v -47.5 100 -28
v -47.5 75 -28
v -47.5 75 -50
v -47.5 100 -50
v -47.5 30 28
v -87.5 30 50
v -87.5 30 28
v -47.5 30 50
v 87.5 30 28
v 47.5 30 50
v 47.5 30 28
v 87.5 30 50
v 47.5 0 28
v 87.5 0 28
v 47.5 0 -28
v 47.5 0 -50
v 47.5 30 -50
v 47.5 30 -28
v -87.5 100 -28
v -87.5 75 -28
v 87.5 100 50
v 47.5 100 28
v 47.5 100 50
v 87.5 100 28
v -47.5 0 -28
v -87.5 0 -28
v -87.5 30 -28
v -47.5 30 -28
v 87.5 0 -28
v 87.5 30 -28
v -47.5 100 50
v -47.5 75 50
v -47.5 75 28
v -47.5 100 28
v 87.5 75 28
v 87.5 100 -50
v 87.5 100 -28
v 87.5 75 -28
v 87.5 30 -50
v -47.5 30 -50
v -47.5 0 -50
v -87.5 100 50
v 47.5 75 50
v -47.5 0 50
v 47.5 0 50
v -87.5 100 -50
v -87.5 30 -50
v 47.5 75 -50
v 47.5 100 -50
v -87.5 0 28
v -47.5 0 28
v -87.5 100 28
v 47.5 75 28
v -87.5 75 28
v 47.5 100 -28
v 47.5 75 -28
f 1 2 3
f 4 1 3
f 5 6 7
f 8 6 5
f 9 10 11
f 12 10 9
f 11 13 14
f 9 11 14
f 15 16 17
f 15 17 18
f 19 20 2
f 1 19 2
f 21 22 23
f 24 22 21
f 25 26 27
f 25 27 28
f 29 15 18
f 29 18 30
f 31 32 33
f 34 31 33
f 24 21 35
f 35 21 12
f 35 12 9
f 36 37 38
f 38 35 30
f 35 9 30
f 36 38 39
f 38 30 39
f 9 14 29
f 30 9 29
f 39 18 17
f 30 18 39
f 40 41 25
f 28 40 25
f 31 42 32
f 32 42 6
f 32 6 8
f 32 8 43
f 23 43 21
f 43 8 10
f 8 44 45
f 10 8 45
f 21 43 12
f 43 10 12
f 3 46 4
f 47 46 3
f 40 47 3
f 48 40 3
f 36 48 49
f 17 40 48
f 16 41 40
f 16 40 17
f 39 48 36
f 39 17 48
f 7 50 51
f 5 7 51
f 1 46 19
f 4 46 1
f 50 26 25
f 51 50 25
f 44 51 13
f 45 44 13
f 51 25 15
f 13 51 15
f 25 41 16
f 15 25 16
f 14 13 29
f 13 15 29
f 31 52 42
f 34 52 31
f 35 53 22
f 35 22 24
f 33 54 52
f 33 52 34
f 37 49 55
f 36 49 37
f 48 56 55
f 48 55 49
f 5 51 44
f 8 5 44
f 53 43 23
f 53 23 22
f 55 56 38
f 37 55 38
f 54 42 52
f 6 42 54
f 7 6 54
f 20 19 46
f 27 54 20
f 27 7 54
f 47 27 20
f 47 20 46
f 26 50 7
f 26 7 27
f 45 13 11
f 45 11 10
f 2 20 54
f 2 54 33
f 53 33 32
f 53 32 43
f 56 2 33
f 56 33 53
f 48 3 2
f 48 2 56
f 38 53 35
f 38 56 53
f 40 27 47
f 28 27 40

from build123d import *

# Parameters (mm, degrees)
SKETCH2_W           = 175
SKETCH2_H           = 100
BOSS_EXTRUDE1_DEPTH = 75
SKETCH3_W           = 40
SKETCH3_H           = 22
CUT_EXTRUDE1_DEPTH  = 30
SKETCH4_W           = 40
SKETCH4_H           = 22
BOSS_EXTRUDE2_DEPTH = 25


with BuildPart() as part:
    # Sketch2 → Boss-Extrude1 (new body)
    with BuildSketch(Plane(origin=(0, 0, 0), x_dir=(1, 0, 0), z_dir=(0, 1, 0))):
        Rectangle(SKETCH2_W, SKETCH2_H)
    extrude(amount=BOSS_EXTRUDE1_DEPTH)

    # Sketch3 → Cut-Extrude1 (cut)
    with BuildSketch(Plane.XZ):
        with Locations((-67.5, 39)):
            Rectangle(SKETCH3_W, SKETCH3_H)
        with Locations((67.5, 39)):
            Rectangle(SKETCH3_W, SKETCH3_H)
        with Locations((-67.5, -39)):
            Rectangle(SKETCH3_W, SKETCH3_H)
        with Locations((67.5, -39)):
            Rectangle(SKETCH3_W, SKETCH3_H)
    extrude(amount=-CUT_EXTRUDE1_DEPTH, mode=Mode.SUBTRACT)

    # Sketch4 → Boss-Extrude2 (add)
    with BuildSketch(Plane(origin=(0, 75, 0), x_dir=(1, 0, 0), z_dir=(0, 1, 0))):
        with Locations((-67.5, 39)):
            Rectangle(SKETCH4_W, SKETCH4_H)
        with Locations((67.5, 39)):
            Rectangle(SKETCH4_W, SKETCH4_H)
        with Locations((67.5, -39)):
            Rectangle(SKETCH4_W, SKETCH4_H)
        with Locations((-67.5, -39)):
            Rectangle(SKETCH4_W, SKETCH4_H)
    extrude(amount=BOSS_EXTRUDE2_DEPTH)


solid = part.part
